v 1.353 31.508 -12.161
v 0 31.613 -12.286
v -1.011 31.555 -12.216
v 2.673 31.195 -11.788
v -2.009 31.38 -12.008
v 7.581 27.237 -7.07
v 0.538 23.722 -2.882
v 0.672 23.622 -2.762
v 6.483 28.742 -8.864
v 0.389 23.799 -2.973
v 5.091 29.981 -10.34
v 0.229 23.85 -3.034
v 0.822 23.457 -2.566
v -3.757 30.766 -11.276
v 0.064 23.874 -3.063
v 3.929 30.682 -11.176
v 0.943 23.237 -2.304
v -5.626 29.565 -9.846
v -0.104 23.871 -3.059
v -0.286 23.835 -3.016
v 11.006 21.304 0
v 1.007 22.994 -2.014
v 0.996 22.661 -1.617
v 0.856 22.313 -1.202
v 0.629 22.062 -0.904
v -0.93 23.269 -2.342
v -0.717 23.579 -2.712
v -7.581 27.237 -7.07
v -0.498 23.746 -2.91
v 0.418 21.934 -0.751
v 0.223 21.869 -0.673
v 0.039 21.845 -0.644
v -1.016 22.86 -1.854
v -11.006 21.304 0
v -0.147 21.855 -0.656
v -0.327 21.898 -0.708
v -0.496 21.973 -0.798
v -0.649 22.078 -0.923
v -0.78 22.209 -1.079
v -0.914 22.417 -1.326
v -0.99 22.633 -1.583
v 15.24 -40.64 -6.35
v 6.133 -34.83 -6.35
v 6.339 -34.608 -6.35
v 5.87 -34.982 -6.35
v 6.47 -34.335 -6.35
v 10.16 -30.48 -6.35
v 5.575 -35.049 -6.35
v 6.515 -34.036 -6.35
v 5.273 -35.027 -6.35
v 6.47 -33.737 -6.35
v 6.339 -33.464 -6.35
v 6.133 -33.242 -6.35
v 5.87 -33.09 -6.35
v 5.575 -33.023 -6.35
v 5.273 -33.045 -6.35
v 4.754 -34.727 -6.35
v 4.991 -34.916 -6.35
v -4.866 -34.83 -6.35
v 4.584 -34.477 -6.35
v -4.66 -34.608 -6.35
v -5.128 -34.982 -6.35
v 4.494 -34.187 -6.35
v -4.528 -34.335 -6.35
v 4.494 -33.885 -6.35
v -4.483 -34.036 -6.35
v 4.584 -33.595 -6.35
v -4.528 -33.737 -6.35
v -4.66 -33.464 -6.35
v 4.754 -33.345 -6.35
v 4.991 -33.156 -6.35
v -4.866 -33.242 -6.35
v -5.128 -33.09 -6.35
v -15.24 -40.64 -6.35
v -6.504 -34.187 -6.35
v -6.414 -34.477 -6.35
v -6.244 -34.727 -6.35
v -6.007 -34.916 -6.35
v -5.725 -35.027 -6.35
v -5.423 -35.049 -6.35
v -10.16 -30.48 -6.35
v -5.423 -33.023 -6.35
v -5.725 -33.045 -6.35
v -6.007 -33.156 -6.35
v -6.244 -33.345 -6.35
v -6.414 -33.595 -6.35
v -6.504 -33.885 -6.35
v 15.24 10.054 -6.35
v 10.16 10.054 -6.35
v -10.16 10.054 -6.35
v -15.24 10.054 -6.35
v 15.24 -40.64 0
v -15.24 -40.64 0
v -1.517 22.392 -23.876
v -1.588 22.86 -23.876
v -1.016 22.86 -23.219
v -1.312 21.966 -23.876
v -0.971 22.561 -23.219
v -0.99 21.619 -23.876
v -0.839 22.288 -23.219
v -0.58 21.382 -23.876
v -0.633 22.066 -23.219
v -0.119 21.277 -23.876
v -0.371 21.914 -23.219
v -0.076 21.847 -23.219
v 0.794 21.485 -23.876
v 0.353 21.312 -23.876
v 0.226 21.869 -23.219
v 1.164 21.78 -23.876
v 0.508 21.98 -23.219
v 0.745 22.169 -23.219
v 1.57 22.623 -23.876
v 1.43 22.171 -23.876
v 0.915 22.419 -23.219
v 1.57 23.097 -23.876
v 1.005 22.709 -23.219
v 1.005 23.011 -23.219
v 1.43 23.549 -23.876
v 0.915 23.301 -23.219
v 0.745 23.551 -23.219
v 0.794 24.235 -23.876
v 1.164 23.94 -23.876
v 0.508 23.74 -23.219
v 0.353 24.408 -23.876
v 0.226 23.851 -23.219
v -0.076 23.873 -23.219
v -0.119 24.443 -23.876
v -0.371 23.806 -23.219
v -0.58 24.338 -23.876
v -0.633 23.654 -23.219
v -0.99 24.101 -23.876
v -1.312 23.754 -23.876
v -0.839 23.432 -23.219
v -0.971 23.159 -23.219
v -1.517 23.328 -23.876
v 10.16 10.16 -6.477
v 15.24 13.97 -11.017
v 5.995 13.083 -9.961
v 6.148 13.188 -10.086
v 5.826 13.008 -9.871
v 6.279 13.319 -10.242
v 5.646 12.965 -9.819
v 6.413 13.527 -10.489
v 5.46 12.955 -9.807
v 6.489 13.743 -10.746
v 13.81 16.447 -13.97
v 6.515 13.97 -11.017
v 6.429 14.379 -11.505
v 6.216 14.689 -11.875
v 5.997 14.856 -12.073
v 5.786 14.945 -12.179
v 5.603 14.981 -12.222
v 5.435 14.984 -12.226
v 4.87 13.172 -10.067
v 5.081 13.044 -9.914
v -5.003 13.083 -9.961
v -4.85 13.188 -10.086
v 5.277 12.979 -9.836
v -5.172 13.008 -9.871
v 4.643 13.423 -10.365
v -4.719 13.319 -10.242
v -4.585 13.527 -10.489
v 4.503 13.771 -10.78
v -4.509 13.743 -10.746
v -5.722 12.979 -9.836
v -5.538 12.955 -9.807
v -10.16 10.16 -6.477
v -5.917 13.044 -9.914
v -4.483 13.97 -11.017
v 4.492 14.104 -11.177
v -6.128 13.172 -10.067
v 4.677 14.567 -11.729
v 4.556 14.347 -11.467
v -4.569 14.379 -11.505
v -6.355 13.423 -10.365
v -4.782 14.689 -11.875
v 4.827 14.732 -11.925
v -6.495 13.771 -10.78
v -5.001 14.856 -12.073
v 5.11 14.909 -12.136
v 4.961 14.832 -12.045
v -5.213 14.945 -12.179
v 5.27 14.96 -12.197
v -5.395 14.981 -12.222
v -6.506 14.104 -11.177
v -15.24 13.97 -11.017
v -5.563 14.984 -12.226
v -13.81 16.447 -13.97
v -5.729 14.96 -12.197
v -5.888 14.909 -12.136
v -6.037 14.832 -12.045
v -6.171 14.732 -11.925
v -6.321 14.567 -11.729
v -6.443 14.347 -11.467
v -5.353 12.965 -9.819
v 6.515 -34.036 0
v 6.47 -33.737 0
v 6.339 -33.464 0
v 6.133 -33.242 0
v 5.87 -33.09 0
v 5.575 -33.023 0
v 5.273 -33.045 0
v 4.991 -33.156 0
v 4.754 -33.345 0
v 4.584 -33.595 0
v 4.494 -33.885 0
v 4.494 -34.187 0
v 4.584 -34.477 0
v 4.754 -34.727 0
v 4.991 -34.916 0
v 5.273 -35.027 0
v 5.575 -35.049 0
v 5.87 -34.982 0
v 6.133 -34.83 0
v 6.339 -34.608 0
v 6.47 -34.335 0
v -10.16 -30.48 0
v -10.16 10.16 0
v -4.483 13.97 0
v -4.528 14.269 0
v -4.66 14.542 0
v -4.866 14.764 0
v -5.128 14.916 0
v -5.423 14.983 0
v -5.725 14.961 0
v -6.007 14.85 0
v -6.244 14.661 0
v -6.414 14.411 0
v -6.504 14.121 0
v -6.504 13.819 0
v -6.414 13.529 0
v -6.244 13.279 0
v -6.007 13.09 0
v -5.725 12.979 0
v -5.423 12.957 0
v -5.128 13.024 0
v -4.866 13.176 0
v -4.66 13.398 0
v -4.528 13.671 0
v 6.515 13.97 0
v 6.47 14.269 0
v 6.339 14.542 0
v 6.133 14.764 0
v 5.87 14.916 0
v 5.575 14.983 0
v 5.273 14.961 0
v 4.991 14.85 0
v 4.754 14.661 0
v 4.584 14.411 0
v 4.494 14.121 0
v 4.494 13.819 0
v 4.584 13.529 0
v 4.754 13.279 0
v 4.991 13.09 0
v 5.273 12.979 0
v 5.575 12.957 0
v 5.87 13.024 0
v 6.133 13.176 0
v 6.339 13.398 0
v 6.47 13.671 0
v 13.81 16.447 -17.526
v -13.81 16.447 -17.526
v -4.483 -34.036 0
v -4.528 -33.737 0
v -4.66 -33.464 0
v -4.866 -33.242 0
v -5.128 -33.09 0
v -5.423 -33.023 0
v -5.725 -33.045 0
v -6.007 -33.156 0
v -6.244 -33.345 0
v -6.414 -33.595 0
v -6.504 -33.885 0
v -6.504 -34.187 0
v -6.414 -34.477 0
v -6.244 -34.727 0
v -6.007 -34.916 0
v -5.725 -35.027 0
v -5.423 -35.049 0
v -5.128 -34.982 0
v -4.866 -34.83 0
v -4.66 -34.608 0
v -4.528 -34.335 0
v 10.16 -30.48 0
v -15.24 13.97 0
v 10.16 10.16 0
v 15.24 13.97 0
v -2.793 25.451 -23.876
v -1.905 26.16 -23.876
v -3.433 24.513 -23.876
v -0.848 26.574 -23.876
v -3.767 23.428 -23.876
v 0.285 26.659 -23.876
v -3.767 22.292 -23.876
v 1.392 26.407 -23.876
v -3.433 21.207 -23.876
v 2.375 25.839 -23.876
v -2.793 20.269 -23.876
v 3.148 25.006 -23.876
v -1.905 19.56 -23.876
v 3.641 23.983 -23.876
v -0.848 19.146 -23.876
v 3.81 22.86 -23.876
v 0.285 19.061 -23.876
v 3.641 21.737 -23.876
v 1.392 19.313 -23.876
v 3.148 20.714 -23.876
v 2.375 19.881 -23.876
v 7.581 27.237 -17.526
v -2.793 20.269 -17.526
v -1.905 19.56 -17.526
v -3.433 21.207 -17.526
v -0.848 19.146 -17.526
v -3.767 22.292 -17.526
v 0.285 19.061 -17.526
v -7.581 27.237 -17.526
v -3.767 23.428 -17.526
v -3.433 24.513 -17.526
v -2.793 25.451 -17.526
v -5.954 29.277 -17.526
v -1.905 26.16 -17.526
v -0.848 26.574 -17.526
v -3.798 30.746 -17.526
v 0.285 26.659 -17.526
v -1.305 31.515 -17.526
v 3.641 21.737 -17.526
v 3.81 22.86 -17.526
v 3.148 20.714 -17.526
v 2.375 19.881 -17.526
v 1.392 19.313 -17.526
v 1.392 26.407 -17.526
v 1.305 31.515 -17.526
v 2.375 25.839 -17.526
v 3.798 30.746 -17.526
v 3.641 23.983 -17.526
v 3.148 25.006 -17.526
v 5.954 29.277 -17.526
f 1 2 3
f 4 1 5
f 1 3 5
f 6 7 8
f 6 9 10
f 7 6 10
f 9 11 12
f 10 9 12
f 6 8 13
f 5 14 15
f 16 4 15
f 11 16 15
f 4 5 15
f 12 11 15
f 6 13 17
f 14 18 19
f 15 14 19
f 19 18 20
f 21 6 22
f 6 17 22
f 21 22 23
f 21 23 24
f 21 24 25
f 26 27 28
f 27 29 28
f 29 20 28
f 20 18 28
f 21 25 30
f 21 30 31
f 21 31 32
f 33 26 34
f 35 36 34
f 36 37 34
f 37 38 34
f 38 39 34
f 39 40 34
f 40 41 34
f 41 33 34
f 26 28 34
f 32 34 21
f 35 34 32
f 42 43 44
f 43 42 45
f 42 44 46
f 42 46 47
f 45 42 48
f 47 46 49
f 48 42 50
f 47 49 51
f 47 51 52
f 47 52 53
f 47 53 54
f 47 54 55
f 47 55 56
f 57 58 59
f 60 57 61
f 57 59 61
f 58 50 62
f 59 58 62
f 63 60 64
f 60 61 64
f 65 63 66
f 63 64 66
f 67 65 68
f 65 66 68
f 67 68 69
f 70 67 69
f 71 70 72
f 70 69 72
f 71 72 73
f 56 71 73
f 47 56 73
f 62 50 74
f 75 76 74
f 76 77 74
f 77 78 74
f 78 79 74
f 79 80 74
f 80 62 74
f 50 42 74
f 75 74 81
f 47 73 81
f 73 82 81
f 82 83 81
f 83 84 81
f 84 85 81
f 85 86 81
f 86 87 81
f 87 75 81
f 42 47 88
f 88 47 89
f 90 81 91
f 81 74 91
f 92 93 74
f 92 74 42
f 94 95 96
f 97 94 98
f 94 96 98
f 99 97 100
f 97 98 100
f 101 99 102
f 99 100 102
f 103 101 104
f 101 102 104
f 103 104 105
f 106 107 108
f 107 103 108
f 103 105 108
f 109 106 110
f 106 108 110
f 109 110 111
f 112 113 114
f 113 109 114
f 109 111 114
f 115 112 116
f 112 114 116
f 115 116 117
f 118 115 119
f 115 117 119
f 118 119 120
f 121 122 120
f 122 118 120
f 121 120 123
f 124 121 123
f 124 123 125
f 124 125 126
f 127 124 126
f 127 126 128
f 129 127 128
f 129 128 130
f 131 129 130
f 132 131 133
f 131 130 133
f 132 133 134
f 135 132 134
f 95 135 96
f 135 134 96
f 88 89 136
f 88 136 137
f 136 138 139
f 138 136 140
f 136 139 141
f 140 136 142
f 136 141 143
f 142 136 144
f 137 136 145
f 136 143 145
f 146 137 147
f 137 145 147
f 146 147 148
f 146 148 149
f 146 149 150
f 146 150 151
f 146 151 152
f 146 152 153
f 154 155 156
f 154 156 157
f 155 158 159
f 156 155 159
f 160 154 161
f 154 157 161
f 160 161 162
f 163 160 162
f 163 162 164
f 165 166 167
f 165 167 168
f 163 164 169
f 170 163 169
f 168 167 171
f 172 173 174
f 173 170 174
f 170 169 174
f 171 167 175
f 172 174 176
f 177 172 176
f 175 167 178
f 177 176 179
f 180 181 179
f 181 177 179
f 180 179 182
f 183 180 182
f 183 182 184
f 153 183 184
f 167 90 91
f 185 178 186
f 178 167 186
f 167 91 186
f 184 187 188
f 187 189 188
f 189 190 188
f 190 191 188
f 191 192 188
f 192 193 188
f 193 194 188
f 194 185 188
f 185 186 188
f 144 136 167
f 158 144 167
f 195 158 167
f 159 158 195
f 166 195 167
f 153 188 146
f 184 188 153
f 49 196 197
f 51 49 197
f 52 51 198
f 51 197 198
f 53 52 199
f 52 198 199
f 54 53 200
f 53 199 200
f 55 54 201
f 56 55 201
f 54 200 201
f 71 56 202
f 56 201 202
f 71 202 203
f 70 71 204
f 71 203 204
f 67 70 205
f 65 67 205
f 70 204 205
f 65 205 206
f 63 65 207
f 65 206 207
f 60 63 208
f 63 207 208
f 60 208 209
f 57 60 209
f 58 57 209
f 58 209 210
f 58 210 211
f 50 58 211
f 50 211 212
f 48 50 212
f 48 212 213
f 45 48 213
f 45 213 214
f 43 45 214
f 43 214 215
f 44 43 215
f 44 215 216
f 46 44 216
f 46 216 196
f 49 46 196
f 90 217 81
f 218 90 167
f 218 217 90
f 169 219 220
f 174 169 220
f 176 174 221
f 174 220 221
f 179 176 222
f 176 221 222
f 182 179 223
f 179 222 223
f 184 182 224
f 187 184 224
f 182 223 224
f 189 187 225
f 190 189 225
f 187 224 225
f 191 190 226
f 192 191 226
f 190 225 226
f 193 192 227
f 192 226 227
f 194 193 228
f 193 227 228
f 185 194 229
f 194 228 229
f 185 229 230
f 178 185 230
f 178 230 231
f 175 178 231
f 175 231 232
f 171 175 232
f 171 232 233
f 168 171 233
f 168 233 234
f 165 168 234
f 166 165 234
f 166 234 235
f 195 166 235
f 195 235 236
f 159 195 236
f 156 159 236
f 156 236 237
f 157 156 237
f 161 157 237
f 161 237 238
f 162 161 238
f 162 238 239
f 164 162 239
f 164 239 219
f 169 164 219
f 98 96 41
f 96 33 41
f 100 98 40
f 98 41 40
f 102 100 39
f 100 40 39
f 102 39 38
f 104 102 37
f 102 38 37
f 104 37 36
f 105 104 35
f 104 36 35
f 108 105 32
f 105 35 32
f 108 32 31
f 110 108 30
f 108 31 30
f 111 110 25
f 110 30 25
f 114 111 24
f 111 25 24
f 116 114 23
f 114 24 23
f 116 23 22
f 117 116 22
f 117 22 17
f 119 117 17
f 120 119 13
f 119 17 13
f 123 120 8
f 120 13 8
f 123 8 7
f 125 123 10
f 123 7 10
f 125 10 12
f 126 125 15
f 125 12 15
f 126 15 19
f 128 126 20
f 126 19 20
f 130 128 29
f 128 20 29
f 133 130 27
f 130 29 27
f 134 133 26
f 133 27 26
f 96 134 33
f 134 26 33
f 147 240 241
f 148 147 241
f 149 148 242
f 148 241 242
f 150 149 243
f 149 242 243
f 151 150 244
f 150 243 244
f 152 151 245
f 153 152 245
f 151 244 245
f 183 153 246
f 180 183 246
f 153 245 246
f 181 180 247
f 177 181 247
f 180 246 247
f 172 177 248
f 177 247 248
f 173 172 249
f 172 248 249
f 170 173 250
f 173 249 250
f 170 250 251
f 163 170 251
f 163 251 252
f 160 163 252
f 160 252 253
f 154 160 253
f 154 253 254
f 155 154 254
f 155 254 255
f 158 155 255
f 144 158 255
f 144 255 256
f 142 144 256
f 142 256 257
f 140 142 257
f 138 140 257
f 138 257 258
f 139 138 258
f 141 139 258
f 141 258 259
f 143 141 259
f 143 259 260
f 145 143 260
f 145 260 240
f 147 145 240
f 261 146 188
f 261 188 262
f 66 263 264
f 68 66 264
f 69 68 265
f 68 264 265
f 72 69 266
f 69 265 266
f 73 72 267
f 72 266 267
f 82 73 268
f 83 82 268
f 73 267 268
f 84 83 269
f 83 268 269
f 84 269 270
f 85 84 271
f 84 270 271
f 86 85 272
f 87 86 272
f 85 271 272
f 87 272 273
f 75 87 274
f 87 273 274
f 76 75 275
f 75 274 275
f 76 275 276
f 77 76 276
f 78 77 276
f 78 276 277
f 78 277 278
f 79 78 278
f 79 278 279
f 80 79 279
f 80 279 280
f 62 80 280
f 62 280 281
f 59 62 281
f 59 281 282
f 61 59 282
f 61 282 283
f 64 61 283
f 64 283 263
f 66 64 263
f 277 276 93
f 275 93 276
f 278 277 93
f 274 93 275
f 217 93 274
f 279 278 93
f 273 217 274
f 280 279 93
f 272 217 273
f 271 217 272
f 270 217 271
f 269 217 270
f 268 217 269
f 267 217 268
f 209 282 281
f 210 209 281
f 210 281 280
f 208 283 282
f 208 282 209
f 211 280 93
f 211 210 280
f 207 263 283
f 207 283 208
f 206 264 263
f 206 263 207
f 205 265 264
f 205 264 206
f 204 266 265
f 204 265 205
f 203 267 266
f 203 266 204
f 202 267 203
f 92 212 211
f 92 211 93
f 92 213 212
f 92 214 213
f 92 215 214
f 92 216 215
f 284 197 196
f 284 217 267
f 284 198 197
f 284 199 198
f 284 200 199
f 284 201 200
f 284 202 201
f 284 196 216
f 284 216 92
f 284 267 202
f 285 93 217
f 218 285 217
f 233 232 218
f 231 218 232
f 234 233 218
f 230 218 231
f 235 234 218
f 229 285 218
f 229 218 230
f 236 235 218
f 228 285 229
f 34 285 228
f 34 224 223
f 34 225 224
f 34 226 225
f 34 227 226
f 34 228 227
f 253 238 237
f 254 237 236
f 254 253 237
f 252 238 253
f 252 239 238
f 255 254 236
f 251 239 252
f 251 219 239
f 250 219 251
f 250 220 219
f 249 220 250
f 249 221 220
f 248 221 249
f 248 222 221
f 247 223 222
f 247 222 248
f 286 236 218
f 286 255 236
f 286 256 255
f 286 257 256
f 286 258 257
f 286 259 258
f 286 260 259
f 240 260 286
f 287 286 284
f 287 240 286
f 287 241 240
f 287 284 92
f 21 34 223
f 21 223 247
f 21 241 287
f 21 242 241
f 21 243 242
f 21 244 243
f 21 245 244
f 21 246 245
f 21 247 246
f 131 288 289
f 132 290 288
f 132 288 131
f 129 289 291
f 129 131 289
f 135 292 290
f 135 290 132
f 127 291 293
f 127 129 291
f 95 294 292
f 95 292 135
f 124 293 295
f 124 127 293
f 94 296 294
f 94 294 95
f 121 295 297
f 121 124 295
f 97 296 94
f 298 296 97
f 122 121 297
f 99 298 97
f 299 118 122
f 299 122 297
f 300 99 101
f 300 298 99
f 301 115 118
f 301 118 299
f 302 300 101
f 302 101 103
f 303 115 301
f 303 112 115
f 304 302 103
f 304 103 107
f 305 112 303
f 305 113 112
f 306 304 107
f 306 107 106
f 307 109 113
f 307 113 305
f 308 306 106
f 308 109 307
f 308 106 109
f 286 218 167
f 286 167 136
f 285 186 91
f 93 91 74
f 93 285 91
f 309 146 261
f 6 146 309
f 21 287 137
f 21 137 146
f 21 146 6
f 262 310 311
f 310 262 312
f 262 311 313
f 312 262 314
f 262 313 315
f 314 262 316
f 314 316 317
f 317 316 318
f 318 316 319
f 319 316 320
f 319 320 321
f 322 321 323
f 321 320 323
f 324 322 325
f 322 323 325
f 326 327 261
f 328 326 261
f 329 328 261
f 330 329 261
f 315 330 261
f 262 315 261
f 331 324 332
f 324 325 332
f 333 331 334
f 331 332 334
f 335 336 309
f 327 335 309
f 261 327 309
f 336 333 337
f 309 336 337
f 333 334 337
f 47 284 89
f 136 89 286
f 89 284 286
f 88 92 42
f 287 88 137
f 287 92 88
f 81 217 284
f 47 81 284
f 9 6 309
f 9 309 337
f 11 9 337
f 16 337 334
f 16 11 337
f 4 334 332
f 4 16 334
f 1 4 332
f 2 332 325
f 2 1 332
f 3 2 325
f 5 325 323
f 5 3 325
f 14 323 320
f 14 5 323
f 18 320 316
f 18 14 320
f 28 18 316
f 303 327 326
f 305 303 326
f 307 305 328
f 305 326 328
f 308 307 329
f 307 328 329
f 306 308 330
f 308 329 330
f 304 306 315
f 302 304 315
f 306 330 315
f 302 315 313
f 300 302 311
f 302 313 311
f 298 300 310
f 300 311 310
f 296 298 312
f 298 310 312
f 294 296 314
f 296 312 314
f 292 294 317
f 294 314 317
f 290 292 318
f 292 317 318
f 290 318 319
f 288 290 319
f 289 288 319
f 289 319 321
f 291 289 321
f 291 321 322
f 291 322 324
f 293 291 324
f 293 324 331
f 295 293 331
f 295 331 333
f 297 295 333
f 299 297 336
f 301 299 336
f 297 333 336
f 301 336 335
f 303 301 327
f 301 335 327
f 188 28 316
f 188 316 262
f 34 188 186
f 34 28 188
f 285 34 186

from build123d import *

# Parameters (mm, degrees)
F0_R           = 1.016
F0_W           = 20.32
F0_H           = 40.64
F2_DEPTH       = 17.526
F3_START       = -25.4
F3_DEPTH       = 40.641
F4_R           = 3.81
F5_DEPTH       = 6.35
F7_D           = 2.032
F7_CSINK_D     = 3.175
F7_CSINK_ANGLE = 82


with BuildPart() as f2:
    # F0 (on Top) → F2 (new body, through all)
    with BuildSketch(Plane.XY):
        with BuildLine():
            Line((-15.24, 13.97), (-15.24, -40.64))
            Line((-15.24, -40.64), (15.24, -40.64))
            Line((15.24, -40.64), (15.24, 13.97))
            Line((15.24, 13.97), (7.5805170802, 27.2366135768))
            ThreePointArc((7.5805170802, 27.2366135768), (0, 31.6132271537), (-7.5805170802, 27.2366135768))
            Line((-7.5805170802, 27.2366135768), (-15.24, 13.97))
        make_face()
        with Locations((-5.4991, -34.036)):
            Circle(F0_R, mode=Mode.SUBTRACT)
        with Locations((5.4991, -34.036)):
            Circle(F0_R, mode=Mode.SUBTRACT)
        with Locations((0, -10.16)):
            Rectangle(F0_W, F0_H, mode=Mode.SUBTRACT)
        with Locations((-5.4991, 13.97)):
            Circle(F0_R, mode=Mode.SUBTRACT)
        with Locations((5.4991, 13.97)):
            Circle(F0_R, mode=Mode.SUBTRACT)
    extrude(amount=-F2_DEPTH)

    # F1 (on Right) → F3 (intersect)
    with BuildSketch(Plane.YZ.offset(F3_START)):
        Polygon((21.3039489306, 0), (-40.64, 0), (-40.64, -6.35), (10.053559014, -6.35), (16.4474982036, -13.97), (16.4474982036, -17.526), (31.6132271537, -17.526), (31.6132271537, -12.2861193594), align=None)
    extrude(amount=F3_DEPTH, mode=Mode.INTERSECT)

    # F4 (on face) → F5 (join)
    with BuildSketch(Plane(origin=(0, 0, -17.526), x_dir=(1, 0, 0), z_dir=(0, 0, -1))):
        with Locations((0, -22.86)):
            Circle(F4_R)
    extrude(amount=F5_DEPTH)

    # F7 (through all)
    with Locations(Plane(origin=(0, 0, -23.876), x_dir=(1, 0, 0), z_dir=(0, 0, -1))):
        with Locations((0, -22.86)):
            CounterSinkHole(F7_D / 2, F7_CSINK_D / 2, counter_sink_angle=F7_CSINK_ANGLE)


solid = f2.part
